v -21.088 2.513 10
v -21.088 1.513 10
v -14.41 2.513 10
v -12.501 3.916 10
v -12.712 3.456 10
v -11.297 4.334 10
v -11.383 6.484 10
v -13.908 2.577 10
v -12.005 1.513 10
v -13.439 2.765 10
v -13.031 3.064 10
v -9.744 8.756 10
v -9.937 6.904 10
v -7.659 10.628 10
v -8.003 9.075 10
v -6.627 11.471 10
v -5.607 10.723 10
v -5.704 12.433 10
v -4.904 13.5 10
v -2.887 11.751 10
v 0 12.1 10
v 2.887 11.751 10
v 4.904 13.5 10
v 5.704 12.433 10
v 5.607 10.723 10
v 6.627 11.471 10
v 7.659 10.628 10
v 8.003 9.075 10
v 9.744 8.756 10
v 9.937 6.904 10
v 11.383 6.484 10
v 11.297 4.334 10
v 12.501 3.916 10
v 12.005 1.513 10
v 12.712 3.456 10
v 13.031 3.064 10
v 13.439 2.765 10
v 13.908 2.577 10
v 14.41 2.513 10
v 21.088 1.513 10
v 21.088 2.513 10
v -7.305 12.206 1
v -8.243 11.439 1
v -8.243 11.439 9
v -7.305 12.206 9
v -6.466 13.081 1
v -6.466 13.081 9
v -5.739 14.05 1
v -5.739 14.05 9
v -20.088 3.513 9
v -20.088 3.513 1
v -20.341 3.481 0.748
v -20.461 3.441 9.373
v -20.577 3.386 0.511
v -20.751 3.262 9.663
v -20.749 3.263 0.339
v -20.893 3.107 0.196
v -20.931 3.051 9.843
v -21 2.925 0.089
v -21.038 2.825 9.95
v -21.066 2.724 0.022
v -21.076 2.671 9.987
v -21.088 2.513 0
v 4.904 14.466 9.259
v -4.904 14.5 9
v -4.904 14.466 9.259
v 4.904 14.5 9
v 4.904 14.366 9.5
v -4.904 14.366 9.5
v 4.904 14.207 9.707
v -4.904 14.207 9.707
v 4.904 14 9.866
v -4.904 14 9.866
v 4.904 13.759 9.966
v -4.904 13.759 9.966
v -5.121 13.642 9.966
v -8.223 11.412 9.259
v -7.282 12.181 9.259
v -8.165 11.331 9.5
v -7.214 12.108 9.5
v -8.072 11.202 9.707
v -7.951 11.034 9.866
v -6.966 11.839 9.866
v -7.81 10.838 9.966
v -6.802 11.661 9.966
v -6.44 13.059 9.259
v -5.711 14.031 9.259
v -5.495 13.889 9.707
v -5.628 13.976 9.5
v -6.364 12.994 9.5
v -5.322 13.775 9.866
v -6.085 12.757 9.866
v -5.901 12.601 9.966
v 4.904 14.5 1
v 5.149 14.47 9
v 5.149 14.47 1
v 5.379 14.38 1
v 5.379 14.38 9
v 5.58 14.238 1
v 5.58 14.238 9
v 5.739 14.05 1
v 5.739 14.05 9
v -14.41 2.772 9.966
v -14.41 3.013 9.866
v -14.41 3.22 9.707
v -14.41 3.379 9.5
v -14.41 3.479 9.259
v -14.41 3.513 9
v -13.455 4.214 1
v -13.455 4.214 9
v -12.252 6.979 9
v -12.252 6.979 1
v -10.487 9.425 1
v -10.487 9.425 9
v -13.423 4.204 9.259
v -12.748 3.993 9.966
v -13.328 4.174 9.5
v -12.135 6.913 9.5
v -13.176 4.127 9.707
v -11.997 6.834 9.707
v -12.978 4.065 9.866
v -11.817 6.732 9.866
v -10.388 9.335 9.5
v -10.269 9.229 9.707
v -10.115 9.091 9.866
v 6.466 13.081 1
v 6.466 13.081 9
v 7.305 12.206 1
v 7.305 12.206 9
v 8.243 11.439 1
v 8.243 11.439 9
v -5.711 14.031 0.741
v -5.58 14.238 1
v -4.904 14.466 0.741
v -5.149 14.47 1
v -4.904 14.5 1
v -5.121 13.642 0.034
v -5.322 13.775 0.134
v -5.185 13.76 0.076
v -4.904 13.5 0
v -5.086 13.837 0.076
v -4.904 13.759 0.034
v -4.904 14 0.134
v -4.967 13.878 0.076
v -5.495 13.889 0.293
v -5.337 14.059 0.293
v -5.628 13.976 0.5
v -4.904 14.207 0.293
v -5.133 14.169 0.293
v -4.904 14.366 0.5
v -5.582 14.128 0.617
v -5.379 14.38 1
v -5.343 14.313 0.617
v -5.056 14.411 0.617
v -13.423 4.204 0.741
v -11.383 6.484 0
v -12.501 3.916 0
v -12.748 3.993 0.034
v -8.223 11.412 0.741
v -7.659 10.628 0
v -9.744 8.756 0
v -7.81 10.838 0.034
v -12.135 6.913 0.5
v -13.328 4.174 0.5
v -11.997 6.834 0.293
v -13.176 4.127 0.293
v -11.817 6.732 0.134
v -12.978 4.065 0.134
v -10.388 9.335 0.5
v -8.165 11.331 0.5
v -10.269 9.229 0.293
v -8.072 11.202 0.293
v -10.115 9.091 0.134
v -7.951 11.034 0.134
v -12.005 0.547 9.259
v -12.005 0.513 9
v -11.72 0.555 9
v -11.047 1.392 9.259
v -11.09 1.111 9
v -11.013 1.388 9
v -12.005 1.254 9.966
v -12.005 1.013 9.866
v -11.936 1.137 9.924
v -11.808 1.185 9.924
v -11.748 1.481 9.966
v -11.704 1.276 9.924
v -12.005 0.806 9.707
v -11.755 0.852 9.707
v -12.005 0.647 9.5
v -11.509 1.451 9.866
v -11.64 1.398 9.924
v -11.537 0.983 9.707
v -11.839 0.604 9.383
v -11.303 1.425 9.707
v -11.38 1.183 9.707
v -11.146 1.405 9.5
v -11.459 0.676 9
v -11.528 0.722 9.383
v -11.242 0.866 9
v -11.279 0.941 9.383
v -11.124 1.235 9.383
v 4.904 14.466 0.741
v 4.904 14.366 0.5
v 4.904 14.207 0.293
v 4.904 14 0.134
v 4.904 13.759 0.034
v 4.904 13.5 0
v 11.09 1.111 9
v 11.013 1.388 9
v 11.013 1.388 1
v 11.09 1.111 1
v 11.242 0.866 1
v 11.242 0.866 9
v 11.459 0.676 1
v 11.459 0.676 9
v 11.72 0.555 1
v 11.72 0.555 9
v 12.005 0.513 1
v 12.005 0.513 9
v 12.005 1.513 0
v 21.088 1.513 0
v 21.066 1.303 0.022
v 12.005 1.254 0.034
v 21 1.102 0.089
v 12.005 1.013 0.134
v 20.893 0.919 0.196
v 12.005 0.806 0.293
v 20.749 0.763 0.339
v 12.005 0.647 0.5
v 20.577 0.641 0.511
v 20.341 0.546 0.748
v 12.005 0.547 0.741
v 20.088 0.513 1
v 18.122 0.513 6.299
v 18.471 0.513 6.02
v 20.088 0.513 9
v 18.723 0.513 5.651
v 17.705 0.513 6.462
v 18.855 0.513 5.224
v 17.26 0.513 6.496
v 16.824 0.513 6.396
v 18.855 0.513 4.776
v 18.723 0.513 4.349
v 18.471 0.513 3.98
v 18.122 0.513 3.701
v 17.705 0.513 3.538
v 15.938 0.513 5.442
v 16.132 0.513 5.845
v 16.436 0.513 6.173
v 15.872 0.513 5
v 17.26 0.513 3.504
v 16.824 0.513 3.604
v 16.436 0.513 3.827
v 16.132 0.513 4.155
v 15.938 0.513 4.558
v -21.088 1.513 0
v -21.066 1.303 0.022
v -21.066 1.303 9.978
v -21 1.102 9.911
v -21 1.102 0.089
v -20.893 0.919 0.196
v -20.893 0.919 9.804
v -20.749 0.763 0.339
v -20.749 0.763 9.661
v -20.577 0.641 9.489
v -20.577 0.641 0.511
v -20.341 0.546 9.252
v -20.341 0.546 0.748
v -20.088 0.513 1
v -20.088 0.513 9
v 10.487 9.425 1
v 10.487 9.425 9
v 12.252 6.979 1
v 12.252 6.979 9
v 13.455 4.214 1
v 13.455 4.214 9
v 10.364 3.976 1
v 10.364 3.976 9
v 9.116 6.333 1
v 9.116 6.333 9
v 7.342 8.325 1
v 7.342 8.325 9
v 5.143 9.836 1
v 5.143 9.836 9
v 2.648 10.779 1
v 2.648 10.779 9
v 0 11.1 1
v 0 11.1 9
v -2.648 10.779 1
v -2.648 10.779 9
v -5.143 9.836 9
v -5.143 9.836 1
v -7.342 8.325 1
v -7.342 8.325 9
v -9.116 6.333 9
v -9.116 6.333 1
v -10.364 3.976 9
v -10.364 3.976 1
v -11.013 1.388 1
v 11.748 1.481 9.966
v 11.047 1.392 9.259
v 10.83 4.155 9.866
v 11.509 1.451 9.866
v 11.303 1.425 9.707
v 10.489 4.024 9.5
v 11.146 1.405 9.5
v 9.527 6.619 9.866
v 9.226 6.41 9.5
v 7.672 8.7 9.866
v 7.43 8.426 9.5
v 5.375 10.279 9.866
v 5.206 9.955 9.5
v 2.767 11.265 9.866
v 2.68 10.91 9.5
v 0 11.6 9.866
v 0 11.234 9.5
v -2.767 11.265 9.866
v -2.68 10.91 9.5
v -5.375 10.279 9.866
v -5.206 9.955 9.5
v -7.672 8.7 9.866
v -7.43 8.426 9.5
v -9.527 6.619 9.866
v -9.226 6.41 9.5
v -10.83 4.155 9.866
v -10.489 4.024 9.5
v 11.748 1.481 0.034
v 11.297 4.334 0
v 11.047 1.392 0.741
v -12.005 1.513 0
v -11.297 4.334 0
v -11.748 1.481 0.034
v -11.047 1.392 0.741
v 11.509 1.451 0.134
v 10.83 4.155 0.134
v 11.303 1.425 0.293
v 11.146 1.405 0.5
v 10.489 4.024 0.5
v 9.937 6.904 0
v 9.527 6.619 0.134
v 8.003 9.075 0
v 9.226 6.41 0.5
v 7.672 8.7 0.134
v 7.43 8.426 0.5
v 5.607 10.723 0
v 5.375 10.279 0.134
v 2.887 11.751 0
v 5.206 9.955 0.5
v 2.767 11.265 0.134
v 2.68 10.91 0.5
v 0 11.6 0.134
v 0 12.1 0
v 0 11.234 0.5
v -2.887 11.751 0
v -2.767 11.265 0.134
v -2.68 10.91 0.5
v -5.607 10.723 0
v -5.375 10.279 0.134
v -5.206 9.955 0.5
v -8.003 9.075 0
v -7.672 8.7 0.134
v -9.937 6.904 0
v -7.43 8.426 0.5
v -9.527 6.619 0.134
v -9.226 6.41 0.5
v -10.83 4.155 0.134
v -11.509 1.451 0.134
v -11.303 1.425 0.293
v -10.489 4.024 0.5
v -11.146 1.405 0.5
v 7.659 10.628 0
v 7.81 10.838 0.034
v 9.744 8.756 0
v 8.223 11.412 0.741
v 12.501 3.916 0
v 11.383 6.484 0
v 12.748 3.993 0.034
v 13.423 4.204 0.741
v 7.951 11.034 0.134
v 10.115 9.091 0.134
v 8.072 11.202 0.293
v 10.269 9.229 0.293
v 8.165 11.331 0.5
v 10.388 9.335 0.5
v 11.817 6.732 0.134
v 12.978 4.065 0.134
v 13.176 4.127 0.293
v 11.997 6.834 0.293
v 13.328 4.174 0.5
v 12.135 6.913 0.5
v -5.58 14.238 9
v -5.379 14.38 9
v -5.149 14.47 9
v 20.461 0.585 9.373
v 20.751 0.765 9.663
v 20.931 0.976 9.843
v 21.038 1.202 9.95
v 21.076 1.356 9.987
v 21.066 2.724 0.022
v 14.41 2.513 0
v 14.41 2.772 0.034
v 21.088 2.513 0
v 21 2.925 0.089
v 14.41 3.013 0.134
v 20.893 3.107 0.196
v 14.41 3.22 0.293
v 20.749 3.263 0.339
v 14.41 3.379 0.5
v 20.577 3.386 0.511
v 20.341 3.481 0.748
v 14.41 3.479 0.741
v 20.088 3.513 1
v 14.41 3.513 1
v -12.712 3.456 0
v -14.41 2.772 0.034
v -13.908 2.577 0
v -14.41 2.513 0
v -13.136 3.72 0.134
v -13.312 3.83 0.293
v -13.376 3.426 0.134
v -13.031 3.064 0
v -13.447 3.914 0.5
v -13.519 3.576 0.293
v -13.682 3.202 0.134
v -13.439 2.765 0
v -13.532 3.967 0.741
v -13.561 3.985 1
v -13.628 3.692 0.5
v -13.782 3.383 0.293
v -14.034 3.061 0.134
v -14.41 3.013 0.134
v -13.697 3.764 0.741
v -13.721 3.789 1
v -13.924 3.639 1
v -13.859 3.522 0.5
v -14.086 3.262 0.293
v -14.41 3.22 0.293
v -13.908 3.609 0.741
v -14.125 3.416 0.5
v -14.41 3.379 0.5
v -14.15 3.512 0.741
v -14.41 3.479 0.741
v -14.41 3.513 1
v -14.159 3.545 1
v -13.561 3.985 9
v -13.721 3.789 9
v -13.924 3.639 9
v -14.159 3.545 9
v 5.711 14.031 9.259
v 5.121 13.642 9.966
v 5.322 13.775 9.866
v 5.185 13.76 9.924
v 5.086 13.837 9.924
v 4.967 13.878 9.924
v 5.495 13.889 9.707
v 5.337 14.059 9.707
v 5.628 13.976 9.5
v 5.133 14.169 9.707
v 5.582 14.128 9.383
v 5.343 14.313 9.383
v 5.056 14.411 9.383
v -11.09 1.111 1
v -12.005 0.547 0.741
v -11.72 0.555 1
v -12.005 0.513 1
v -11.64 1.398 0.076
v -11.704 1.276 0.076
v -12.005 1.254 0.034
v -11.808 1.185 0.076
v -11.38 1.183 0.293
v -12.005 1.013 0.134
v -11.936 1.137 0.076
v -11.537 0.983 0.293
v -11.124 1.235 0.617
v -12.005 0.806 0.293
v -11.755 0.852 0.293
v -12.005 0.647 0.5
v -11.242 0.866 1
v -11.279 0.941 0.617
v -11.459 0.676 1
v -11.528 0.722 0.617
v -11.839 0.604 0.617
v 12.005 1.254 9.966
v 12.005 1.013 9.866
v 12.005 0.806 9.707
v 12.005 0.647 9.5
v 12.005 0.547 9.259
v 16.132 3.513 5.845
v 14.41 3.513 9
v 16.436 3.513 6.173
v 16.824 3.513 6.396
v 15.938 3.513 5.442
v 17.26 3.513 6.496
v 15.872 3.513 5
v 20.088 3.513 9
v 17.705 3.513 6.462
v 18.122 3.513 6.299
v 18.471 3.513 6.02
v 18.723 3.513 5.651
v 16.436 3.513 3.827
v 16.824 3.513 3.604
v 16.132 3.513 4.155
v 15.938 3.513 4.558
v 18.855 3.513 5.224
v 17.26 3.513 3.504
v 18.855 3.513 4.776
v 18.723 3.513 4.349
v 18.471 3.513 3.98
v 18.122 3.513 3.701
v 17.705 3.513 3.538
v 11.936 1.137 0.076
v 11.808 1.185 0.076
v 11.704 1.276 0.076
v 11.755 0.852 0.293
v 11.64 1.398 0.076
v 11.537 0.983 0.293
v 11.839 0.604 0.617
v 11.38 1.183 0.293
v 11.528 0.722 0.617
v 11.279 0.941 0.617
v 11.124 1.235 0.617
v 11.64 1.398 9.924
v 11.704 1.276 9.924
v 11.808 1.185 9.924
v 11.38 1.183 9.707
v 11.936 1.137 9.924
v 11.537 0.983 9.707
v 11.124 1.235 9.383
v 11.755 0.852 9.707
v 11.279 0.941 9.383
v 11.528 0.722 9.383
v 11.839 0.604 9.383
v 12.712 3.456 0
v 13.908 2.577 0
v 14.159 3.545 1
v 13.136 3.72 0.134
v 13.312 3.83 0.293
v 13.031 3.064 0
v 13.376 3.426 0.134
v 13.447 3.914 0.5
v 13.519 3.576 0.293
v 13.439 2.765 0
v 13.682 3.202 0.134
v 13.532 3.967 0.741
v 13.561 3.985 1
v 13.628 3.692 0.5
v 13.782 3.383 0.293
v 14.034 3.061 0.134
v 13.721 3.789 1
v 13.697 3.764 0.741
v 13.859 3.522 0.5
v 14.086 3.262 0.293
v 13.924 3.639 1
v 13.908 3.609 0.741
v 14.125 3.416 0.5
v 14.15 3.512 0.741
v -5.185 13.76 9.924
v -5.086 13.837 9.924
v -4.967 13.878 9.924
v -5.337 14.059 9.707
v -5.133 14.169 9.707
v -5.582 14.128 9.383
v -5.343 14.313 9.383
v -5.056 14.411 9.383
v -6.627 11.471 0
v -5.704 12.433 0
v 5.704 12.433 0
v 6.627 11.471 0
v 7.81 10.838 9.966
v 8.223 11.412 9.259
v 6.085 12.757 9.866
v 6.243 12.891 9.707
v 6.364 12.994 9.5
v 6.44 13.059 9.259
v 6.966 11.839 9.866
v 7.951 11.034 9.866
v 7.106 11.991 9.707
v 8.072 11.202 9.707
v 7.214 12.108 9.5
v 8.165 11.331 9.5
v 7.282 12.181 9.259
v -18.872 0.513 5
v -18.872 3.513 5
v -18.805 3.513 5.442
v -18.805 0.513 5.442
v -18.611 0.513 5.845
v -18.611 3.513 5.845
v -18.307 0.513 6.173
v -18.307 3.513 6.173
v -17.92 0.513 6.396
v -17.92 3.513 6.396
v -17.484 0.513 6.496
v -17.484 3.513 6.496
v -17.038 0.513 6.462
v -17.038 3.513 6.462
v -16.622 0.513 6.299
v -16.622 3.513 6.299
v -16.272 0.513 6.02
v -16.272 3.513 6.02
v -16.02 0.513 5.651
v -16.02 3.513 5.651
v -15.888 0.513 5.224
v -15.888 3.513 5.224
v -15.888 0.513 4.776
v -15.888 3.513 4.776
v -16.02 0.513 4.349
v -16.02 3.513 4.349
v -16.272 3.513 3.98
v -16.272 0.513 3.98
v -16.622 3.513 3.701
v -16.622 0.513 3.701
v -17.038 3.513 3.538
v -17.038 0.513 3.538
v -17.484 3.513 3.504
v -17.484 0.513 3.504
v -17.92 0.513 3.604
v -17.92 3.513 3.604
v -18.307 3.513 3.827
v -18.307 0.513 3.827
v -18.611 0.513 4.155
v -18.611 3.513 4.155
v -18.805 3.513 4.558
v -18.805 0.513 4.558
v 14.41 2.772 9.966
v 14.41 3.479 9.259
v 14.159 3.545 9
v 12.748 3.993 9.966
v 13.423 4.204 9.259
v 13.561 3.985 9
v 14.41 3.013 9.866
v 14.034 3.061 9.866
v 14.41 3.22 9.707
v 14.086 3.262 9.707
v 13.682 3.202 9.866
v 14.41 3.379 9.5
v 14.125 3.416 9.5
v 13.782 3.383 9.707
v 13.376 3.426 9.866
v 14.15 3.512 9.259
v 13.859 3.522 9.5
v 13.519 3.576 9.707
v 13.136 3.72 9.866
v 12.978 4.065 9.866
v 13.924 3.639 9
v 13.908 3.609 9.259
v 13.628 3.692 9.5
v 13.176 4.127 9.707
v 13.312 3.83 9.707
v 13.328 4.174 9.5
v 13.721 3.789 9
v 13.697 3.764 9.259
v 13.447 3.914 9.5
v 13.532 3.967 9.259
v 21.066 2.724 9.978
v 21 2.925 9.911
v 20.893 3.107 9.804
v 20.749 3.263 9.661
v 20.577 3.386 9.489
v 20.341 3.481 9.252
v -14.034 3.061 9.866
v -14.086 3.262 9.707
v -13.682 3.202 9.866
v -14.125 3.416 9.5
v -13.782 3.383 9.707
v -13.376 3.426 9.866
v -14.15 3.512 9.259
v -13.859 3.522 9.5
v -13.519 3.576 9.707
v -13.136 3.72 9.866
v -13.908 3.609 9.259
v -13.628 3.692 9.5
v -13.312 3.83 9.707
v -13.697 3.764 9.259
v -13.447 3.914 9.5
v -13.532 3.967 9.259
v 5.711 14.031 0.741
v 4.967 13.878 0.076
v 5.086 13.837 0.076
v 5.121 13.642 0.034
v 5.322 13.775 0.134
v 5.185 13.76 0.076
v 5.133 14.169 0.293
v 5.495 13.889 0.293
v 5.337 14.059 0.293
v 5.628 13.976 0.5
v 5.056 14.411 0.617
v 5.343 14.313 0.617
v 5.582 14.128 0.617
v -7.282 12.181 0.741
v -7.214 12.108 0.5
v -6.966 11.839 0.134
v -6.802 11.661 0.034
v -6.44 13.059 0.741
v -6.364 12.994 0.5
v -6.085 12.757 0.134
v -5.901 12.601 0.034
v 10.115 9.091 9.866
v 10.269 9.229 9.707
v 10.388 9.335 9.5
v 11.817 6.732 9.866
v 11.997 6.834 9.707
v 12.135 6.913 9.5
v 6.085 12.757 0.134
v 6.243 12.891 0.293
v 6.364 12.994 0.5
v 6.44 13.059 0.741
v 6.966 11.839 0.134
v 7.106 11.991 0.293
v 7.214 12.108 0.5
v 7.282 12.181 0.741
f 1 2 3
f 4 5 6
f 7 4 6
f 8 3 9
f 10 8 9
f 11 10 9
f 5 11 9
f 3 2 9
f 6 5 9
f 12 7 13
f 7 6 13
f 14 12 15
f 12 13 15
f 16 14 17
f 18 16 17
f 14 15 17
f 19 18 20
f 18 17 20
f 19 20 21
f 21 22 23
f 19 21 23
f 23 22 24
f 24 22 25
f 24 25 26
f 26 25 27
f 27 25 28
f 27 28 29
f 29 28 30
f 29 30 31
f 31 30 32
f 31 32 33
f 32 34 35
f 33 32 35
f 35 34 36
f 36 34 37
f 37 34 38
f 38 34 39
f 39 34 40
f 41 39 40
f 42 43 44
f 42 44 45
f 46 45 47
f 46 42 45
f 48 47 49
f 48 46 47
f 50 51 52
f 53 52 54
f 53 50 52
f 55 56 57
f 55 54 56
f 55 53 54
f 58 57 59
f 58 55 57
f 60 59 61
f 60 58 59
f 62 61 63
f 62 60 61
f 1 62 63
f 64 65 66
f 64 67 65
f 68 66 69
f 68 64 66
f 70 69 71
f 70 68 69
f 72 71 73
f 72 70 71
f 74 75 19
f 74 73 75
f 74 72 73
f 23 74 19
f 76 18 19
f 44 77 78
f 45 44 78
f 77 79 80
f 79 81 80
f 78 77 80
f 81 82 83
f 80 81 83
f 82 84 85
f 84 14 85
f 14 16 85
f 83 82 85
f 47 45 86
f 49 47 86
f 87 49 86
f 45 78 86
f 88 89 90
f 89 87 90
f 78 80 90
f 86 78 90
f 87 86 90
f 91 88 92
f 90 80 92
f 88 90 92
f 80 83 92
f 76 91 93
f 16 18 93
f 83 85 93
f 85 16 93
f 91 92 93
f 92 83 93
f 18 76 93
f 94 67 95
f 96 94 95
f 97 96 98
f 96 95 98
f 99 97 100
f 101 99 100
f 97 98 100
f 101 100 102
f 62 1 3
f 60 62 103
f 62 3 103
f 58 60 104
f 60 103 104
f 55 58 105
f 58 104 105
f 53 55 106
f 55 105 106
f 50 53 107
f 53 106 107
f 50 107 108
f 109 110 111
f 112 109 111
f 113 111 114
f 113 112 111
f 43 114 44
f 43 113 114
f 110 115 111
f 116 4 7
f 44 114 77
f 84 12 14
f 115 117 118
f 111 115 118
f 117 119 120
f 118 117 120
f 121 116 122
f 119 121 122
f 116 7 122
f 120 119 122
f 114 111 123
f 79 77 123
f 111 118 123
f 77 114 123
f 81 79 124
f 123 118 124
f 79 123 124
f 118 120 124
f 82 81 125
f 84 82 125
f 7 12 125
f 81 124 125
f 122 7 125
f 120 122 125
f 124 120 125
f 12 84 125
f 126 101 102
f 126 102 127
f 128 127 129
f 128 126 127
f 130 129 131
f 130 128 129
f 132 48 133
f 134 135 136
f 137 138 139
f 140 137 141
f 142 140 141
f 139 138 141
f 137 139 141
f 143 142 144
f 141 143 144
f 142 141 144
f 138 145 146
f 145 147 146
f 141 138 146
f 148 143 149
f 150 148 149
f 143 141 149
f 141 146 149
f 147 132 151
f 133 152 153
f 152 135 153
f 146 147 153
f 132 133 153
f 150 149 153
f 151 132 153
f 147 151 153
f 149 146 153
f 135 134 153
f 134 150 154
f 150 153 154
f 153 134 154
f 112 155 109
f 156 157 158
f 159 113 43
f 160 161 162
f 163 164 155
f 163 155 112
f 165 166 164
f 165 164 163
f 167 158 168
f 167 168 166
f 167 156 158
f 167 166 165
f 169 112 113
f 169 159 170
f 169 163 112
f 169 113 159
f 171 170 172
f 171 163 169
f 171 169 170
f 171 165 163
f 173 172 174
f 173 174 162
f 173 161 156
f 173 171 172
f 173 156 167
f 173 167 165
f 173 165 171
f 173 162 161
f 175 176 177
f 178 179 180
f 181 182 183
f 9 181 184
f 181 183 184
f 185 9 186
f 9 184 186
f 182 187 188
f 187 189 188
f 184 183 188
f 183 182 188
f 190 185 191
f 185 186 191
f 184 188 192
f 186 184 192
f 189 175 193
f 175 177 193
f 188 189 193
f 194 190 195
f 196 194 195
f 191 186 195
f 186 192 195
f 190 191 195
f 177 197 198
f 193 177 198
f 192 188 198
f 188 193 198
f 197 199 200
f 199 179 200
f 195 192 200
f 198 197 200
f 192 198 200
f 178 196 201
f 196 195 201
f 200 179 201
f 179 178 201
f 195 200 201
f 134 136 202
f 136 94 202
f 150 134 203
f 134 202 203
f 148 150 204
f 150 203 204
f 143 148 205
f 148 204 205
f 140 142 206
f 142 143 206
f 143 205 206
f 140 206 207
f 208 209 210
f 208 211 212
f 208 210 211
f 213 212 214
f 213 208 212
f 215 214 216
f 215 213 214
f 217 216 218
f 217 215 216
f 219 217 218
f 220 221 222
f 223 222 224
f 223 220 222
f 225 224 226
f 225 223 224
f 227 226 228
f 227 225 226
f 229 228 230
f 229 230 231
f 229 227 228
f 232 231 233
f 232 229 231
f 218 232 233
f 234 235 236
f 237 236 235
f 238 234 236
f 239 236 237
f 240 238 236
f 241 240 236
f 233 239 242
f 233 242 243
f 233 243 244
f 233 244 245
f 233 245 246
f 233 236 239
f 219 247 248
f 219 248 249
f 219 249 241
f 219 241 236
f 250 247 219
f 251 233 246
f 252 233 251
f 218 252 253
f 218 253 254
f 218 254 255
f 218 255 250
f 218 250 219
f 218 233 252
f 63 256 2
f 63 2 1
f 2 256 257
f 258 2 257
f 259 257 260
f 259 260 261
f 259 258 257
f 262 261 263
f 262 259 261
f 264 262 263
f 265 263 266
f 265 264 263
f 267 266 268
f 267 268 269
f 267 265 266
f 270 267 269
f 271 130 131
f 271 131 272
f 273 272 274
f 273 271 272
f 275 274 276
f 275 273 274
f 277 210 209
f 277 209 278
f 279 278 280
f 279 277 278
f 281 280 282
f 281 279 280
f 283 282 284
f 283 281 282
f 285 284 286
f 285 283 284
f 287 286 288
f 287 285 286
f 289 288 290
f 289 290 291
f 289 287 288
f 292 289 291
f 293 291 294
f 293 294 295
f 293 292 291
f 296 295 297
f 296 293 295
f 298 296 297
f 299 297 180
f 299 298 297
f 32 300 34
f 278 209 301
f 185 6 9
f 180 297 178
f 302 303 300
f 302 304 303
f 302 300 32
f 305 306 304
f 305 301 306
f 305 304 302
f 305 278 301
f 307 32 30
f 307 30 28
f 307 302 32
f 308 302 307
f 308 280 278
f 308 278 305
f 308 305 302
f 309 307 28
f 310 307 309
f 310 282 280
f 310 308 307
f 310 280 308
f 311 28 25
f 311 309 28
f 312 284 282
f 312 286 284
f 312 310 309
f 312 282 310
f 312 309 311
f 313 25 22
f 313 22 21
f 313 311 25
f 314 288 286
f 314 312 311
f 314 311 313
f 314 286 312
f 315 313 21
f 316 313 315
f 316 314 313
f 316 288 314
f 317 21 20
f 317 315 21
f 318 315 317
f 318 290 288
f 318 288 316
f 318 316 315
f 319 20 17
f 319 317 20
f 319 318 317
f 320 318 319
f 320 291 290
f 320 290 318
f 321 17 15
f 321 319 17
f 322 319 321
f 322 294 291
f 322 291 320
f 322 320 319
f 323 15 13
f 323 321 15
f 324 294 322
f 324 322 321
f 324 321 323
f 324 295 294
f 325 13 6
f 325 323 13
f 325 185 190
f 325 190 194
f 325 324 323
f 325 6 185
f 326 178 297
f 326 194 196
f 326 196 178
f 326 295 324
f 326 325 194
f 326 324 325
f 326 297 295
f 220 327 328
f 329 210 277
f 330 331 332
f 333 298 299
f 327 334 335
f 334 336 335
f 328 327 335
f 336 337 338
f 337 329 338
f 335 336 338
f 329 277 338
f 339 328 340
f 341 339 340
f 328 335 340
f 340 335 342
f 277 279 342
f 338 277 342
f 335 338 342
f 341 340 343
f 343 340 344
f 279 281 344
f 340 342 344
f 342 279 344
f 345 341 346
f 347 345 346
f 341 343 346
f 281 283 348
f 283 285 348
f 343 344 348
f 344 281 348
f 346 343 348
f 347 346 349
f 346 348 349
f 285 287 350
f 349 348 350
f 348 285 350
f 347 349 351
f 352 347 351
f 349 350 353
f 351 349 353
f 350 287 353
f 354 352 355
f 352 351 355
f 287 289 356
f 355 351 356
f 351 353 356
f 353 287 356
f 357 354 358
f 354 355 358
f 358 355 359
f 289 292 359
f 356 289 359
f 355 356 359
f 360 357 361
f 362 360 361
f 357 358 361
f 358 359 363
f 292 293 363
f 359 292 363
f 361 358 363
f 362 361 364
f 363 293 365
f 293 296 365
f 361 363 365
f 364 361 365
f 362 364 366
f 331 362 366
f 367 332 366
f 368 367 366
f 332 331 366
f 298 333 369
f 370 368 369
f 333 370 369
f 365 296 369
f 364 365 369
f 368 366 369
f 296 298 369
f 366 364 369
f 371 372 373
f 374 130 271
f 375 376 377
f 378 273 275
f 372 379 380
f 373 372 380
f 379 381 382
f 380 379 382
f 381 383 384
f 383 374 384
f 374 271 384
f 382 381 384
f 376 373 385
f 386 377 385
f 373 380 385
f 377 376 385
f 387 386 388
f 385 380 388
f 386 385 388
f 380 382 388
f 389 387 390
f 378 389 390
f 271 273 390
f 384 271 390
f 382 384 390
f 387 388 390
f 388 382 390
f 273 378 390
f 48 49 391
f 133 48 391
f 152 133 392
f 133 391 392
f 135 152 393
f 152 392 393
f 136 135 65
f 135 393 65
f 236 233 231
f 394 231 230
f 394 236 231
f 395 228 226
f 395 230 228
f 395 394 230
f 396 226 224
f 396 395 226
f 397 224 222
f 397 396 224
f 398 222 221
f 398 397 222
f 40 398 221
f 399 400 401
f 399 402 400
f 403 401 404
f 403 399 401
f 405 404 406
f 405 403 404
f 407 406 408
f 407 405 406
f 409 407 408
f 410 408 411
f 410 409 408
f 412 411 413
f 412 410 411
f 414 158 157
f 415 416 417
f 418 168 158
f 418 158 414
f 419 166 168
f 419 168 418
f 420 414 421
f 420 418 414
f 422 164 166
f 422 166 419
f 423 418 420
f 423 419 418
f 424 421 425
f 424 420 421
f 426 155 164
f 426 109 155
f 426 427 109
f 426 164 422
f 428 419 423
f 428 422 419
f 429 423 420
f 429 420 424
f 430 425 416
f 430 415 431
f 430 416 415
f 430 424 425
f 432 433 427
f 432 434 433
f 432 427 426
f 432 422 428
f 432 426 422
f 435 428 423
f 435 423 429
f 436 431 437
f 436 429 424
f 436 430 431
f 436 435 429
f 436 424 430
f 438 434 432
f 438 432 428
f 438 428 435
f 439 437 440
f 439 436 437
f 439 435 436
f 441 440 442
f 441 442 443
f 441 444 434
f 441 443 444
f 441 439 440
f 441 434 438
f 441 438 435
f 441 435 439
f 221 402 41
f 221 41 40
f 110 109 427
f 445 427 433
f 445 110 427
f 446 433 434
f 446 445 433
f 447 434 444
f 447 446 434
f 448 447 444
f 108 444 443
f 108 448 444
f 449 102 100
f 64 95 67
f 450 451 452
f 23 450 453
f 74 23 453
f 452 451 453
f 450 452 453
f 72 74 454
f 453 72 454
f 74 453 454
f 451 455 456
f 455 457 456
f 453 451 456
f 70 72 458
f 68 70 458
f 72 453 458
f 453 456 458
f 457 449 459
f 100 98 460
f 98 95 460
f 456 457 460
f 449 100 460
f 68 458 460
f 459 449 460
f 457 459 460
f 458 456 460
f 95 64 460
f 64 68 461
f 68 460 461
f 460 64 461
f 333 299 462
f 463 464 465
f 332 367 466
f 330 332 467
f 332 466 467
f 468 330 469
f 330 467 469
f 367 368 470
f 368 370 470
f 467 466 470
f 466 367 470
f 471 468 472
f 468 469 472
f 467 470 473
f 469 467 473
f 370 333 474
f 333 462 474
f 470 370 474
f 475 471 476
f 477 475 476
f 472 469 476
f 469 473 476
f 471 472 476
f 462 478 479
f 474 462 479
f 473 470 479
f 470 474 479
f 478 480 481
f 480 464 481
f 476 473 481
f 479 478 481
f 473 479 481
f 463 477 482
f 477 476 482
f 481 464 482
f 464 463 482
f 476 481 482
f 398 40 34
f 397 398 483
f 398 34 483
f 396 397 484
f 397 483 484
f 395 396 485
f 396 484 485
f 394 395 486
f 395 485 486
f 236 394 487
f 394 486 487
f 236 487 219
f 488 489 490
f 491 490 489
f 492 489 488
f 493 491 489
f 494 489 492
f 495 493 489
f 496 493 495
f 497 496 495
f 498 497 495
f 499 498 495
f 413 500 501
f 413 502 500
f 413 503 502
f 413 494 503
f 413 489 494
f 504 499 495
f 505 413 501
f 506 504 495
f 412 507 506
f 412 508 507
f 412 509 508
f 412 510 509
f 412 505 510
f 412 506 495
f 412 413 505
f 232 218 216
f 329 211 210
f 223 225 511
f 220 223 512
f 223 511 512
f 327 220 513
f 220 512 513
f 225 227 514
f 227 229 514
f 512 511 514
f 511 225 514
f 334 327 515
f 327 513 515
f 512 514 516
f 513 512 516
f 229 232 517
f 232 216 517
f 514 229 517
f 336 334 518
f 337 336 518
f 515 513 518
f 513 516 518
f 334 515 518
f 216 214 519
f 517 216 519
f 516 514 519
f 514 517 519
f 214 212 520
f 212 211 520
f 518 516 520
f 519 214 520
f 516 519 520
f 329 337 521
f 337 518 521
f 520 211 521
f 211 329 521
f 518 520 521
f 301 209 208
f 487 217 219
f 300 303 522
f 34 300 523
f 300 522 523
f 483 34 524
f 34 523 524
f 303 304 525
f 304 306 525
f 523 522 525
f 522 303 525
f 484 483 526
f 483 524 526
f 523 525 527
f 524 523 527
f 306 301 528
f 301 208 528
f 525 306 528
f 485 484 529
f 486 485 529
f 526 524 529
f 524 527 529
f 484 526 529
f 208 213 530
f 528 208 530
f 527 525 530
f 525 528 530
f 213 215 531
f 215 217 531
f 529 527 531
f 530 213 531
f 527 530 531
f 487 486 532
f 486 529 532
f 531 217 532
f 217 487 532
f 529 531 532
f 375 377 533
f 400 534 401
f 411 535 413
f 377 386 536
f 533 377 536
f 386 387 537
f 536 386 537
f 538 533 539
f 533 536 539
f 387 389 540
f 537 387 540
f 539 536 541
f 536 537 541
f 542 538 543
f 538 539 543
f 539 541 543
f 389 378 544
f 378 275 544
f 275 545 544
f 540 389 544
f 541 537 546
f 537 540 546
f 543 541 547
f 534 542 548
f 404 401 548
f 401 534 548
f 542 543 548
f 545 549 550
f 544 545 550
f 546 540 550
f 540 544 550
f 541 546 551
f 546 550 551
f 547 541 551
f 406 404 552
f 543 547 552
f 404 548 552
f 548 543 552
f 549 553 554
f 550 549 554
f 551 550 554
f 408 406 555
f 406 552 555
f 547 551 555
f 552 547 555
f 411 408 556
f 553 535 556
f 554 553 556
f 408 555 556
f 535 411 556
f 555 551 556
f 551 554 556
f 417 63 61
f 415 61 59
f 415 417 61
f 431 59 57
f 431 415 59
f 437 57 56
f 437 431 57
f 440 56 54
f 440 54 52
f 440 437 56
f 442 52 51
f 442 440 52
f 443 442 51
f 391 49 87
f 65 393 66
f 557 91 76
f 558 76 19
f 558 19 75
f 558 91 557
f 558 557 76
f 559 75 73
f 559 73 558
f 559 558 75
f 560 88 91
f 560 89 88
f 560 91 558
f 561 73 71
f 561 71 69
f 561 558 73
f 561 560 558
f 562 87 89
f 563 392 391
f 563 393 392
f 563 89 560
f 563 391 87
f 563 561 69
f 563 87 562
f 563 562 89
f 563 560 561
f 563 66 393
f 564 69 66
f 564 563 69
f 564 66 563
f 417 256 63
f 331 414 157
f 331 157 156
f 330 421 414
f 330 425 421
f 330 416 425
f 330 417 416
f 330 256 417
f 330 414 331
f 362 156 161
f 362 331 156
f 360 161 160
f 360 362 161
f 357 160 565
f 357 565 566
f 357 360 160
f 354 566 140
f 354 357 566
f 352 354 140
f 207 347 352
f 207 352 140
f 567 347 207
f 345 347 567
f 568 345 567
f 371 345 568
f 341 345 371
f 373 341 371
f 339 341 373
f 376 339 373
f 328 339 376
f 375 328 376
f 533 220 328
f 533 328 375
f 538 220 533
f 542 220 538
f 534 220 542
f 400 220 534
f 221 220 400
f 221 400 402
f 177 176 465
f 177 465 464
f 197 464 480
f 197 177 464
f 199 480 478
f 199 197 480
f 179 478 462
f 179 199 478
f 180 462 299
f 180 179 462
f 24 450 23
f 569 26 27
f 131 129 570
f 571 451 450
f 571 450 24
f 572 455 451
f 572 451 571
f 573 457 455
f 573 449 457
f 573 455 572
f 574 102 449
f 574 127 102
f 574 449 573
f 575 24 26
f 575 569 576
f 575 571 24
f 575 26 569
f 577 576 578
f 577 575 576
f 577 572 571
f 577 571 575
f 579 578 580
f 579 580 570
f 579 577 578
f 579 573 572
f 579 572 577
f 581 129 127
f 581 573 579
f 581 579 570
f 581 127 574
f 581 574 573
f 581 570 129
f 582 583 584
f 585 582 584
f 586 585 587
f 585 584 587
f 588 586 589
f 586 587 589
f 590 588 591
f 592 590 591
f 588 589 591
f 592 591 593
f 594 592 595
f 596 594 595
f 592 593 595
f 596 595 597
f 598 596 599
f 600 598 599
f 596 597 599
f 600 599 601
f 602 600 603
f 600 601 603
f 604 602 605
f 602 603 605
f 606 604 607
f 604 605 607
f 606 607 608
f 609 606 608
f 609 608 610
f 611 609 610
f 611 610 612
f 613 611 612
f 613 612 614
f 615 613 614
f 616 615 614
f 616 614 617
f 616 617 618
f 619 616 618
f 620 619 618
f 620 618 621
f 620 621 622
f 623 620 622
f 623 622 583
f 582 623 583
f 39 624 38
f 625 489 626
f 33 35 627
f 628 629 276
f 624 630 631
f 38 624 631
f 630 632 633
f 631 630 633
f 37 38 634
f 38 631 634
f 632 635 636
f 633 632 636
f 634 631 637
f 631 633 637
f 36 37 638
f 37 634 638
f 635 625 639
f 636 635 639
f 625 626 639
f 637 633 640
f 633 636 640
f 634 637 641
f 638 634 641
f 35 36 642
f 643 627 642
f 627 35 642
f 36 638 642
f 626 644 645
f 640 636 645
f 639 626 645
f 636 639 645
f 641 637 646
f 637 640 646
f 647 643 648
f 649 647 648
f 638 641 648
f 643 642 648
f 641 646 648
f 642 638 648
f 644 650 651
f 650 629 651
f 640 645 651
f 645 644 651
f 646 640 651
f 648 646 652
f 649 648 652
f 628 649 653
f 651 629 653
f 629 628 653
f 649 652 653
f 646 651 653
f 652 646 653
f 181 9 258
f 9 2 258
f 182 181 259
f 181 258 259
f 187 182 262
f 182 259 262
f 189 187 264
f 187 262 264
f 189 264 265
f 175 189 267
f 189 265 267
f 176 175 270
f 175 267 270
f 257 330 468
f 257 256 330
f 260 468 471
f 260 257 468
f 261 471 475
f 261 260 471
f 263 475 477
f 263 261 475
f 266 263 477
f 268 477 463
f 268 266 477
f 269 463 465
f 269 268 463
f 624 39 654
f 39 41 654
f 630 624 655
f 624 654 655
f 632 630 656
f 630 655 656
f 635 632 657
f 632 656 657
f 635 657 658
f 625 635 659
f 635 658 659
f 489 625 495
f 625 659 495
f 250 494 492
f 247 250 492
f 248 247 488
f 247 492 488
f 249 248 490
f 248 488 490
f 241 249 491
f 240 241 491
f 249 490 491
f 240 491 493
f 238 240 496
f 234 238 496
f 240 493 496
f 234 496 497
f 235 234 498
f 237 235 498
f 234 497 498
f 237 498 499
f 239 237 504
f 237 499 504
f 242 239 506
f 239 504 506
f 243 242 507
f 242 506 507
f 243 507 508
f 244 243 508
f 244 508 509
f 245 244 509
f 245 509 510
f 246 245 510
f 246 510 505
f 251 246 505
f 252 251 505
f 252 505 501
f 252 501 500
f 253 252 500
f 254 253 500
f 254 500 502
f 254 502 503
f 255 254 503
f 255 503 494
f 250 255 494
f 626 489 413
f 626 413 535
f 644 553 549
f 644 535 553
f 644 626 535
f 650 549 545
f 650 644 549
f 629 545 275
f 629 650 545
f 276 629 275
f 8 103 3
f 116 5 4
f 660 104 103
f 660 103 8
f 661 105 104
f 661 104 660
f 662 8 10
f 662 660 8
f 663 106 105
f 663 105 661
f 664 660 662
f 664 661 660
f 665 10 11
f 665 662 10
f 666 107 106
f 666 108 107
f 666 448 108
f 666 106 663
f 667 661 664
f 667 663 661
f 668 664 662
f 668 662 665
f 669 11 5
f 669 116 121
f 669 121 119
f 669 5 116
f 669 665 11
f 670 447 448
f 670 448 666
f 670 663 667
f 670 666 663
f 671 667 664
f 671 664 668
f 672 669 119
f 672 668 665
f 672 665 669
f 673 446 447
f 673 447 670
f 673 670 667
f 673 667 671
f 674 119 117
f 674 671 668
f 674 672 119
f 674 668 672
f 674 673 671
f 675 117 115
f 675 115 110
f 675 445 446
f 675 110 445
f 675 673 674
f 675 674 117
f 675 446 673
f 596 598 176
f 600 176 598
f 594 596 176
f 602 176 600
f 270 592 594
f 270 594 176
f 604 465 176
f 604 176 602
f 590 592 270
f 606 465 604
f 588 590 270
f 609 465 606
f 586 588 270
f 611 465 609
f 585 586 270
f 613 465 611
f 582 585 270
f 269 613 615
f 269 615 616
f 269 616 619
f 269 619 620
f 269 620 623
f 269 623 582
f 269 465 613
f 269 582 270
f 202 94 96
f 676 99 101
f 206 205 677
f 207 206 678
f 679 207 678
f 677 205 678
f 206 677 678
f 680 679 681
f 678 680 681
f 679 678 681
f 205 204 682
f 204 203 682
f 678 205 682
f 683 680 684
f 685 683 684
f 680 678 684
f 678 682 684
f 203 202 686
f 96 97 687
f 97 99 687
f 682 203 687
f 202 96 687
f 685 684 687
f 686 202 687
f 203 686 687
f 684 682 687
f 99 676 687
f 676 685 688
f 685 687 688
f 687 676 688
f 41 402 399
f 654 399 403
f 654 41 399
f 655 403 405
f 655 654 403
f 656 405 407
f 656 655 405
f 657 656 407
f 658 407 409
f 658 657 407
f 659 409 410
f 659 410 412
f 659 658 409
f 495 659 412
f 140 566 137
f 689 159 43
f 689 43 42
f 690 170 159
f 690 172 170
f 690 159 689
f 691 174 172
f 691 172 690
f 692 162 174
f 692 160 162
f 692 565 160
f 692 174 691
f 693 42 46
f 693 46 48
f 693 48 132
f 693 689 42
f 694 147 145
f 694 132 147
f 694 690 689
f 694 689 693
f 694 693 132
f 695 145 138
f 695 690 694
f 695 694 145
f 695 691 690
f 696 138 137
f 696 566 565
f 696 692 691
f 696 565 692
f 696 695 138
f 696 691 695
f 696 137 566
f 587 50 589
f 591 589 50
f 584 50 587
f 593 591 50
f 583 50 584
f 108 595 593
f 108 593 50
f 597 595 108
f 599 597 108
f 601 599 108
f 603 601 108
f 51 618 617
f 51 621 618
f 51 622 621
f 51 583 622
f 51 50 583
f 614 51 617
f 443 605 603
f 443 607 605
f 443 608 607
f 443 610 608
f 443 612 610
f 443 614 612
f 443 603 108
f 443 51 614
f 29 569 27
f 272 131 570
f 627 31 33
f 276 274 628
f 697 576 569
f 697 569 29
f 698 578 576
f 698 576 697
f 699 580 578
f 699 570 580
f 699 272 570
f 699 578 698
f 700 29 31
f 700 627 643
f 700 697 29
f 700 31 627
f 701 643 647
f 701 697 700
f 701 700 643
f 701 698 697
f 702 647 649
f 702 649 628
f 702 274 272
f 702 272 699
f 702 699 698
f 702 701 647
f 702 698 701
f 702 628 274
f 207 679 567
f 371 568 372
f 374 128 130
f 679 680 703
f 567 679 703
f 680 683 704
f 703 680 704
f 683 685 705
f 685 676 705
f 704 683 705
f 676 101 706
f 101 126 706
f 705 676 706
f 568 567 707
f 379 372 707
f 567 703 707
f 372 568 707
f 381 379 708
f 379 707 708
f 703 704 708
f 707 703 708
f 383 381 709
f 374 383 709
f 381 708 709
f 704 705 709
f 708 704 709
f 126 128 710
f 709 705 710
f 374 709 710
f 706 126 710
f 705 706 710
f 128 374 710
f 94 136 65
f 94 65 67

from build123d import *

# Parameters (mm, degrees)
BOSS_EXTRUDE1_DEPTH = 10
CUT_EXTRUDE1_REACH  = 27.796
SKETCH2_R           = 1.5
FILLET1_R           = 10
FILLET2_R           = 1


with BuildPart() as part:
    # Sketch1 → Boss-Extrude1 (new body)
    with BuildSketch(Plane.XY):
        with BuildLine():
            Line((-5.459853478, 13), (-5.459853478, 14.5))
            Line((-5.459853478, 14.5), (5.459853478, 14.5))
            Line((5.459853478, 14.5), (5.459853478, 13))
            ThreePointArc((5.459853478, 13), (10.669887711, 9.21756455), (13.655283113, 3.513295191))
            Line((13.655283113, 3.513295191), (21.088125543, 3.513295191))
            Line((21.088125543, 3.513295191), (21.088125543, 0.513295191))
            Line((21.088125543, 0.513295191), (11.088125543, 0.513295191))
            ThreePointArc((11.088125543, 0.513295191), (0, 11.1), (-11.088125543, 0.513295191))
            Line((-11.088125543, 0.513295191), (-21.088125543, 0.513295191))
            Line((-21.088125543, 0.513295191), (-21.088125543, 3.513295191))
            Line((-21.088125543, 3.513295191), (-13.655283113, 3.513295191))
            ThreePointArc((-13.655283113, 3.513295191), (-10.669887711, 9.21756455), (-5.459853478, 13))
        make_face()
    extrude(amount=BOSS_EXTRUDE1_DEPTH)

    # Sketch2 → Cut-Extrude1 (cut, up to next)
    with BuildSketch(Plane(origin=(0, 3.513295191, 0), x_dir=(1, 0, 0), z_dir=(0, 1, 0)), mode=Mode.PRIVATE) as cut_extrude1_sk1:
        with Locations(Location((-17.371704328, -5, 0), (0, 0, 180))):
            Circle(SKETCH2_R)
    cut_extrude1_tool1 = extrude(cut_extrude1_sk1.sketch, amount=-CUT_EXTRUDE1_REACH, mode=Mode.PRIVATE) & part.part
    # Sketch2 → Cut-Extrude1 (cut, up to next)
    with BuildSketch(Plane(origin=(0, 3.513295191, 0), x_dir=(1, 0, 0), z_dir=(0, 1, 0)), mode=Mode.PRIVATE) as cut_extrude1_sk2:
        with Locations(Location((17.371704328, -5, 0), (0, 0, 180))):
            Circle(SKETCH2_R)
    cut_extrude1_tool2 = extrude(cut_extrude1_sk2.sketch, amount=-CUT_EXTRUDE1_REACH, mode=Mode.PRIVATE) & part.part
    add(cut_extrude1_tool1.solids().sort_by_distance((-17.371704, 3.513295, 5))[0], mode=Mode.SUBTRACT)
    add(cut_extrude1_tool2.solids().sort_by_distance((17.371704, 3.513295, 5))[0], mode=Mode.SUBTRACT)

    # Fillet1
    # the kernel refuses this fillet: 10 mm, written as the material it adds along each edge
    with BuildSketch(Plane(origin=(5.459853478, 13, 0), x_dir=(0, 1, 0), z_dir=(0, 0, 1))) as fillet1_piece_1:
        with BuildLine():
            CenterArc((6.552206942, -8.629901796), FILLET1_R, 120.346003633, 23.876636028)
            Line((-1.560741996, -2.783530313), (-1.723000975, -2.666602883))
            ThreePointArc((-1.723000975, -2.666602883), (-0.875816916, -1.338248063), (-0.184397163, 0.07744473))
            Line((-0.184397163, 0.07744473), (0, 0.2))
            ThreePointArc((0, 0.2), (0.75, 0.2), (1.398955861, 0.172598036))
            Line((1.398955861, 0.172598036), (1.5, 0))
        make_face()
    extrude(amount=10)
    with BuildSketch(Plane(origin=(-5.459853478, 13, 0), x_dir=(-0.8722433873059962, -0.4890720532814792, 0), z_dir=(0, 0, 1))) as fillet1_piece_2:
        with BuildLine():
            CenterArc((4.322873472, -9.935762969), FILLET1_R, 96.497751777, 23.876636028)
            Line((-0.73360808, -1.308365081), (-0.834737711, -1.135817123))
            ThreePointArc((-0.834737711, -1.135817123), (-0.541252717, -0.55636813), (-0.174448677, 0.097814411))
            Line((-0.174448677, 0.097814411), (0.022632845, 0.198715259))
            ThreePointArc((0.022632845, 0.198715259), (1.595615601, 0.109425786), (3.168598356, 0.198715259))
            Line((3.168598356, 0.198715259), (3.191231202, 0))
        make_face()
    extrude(amount=10)

    # Fillet2
    fillet2_edges = [part.edges().sort_by_distance(p)[0] for p in [
        (16.088125543, 0.513295191, 0),
        (0, 11.1, 0),
        (11.644446087, 7.950904057, 10),
        (-16.088125543, 0.513295191, 0),
        (-17.371704328, 3.513295191, 0),
        (0, 14.5, 0),
        (11.644446087, 7.950904057, 0),
        (17.371704328, 3.513295191, 0),
        (21.088125543, 0.513295191, 5),
        (11.088125543, 0.513295191, 5),
        (-11.088125543, 0.513295191, 5),
        (0, 14.5, 10),
        (-21.088125543, 0.513295191, 5),
        (-21.088125543, 3.513295191, 5),
        (-13.655283113, 3.513295191, 5),
        (-5.459853478, 14.5, 5),
        (5.459853478, 14.5, 5),
        (13.655283113, 3.513295191, 5),
        (21.088125543, 3.513295191, 5),
        (-17.371704328, 3.513295191, 10),
        (-16.088125543, 0.513295191, 10),
        (-11.644446087, 7.950904057, 0),
        (-11.644446087, 7.950904057, 10),
        (0, 11.1, 10),
        (6.691602977, 12.824105977, 0),
        (6.691602977, 12.824105977, 10),
        (-6.691602977, 12.824105977, 0),
        (-6.691602977, 12.824105977, 10),
        (16.088125543, 0.513295191, 10),
        (17.371704328, 3.513295191, 10),
    ]]
    fillet(fillet2_edges, radius=FILLET2_R)


solid = part.part
